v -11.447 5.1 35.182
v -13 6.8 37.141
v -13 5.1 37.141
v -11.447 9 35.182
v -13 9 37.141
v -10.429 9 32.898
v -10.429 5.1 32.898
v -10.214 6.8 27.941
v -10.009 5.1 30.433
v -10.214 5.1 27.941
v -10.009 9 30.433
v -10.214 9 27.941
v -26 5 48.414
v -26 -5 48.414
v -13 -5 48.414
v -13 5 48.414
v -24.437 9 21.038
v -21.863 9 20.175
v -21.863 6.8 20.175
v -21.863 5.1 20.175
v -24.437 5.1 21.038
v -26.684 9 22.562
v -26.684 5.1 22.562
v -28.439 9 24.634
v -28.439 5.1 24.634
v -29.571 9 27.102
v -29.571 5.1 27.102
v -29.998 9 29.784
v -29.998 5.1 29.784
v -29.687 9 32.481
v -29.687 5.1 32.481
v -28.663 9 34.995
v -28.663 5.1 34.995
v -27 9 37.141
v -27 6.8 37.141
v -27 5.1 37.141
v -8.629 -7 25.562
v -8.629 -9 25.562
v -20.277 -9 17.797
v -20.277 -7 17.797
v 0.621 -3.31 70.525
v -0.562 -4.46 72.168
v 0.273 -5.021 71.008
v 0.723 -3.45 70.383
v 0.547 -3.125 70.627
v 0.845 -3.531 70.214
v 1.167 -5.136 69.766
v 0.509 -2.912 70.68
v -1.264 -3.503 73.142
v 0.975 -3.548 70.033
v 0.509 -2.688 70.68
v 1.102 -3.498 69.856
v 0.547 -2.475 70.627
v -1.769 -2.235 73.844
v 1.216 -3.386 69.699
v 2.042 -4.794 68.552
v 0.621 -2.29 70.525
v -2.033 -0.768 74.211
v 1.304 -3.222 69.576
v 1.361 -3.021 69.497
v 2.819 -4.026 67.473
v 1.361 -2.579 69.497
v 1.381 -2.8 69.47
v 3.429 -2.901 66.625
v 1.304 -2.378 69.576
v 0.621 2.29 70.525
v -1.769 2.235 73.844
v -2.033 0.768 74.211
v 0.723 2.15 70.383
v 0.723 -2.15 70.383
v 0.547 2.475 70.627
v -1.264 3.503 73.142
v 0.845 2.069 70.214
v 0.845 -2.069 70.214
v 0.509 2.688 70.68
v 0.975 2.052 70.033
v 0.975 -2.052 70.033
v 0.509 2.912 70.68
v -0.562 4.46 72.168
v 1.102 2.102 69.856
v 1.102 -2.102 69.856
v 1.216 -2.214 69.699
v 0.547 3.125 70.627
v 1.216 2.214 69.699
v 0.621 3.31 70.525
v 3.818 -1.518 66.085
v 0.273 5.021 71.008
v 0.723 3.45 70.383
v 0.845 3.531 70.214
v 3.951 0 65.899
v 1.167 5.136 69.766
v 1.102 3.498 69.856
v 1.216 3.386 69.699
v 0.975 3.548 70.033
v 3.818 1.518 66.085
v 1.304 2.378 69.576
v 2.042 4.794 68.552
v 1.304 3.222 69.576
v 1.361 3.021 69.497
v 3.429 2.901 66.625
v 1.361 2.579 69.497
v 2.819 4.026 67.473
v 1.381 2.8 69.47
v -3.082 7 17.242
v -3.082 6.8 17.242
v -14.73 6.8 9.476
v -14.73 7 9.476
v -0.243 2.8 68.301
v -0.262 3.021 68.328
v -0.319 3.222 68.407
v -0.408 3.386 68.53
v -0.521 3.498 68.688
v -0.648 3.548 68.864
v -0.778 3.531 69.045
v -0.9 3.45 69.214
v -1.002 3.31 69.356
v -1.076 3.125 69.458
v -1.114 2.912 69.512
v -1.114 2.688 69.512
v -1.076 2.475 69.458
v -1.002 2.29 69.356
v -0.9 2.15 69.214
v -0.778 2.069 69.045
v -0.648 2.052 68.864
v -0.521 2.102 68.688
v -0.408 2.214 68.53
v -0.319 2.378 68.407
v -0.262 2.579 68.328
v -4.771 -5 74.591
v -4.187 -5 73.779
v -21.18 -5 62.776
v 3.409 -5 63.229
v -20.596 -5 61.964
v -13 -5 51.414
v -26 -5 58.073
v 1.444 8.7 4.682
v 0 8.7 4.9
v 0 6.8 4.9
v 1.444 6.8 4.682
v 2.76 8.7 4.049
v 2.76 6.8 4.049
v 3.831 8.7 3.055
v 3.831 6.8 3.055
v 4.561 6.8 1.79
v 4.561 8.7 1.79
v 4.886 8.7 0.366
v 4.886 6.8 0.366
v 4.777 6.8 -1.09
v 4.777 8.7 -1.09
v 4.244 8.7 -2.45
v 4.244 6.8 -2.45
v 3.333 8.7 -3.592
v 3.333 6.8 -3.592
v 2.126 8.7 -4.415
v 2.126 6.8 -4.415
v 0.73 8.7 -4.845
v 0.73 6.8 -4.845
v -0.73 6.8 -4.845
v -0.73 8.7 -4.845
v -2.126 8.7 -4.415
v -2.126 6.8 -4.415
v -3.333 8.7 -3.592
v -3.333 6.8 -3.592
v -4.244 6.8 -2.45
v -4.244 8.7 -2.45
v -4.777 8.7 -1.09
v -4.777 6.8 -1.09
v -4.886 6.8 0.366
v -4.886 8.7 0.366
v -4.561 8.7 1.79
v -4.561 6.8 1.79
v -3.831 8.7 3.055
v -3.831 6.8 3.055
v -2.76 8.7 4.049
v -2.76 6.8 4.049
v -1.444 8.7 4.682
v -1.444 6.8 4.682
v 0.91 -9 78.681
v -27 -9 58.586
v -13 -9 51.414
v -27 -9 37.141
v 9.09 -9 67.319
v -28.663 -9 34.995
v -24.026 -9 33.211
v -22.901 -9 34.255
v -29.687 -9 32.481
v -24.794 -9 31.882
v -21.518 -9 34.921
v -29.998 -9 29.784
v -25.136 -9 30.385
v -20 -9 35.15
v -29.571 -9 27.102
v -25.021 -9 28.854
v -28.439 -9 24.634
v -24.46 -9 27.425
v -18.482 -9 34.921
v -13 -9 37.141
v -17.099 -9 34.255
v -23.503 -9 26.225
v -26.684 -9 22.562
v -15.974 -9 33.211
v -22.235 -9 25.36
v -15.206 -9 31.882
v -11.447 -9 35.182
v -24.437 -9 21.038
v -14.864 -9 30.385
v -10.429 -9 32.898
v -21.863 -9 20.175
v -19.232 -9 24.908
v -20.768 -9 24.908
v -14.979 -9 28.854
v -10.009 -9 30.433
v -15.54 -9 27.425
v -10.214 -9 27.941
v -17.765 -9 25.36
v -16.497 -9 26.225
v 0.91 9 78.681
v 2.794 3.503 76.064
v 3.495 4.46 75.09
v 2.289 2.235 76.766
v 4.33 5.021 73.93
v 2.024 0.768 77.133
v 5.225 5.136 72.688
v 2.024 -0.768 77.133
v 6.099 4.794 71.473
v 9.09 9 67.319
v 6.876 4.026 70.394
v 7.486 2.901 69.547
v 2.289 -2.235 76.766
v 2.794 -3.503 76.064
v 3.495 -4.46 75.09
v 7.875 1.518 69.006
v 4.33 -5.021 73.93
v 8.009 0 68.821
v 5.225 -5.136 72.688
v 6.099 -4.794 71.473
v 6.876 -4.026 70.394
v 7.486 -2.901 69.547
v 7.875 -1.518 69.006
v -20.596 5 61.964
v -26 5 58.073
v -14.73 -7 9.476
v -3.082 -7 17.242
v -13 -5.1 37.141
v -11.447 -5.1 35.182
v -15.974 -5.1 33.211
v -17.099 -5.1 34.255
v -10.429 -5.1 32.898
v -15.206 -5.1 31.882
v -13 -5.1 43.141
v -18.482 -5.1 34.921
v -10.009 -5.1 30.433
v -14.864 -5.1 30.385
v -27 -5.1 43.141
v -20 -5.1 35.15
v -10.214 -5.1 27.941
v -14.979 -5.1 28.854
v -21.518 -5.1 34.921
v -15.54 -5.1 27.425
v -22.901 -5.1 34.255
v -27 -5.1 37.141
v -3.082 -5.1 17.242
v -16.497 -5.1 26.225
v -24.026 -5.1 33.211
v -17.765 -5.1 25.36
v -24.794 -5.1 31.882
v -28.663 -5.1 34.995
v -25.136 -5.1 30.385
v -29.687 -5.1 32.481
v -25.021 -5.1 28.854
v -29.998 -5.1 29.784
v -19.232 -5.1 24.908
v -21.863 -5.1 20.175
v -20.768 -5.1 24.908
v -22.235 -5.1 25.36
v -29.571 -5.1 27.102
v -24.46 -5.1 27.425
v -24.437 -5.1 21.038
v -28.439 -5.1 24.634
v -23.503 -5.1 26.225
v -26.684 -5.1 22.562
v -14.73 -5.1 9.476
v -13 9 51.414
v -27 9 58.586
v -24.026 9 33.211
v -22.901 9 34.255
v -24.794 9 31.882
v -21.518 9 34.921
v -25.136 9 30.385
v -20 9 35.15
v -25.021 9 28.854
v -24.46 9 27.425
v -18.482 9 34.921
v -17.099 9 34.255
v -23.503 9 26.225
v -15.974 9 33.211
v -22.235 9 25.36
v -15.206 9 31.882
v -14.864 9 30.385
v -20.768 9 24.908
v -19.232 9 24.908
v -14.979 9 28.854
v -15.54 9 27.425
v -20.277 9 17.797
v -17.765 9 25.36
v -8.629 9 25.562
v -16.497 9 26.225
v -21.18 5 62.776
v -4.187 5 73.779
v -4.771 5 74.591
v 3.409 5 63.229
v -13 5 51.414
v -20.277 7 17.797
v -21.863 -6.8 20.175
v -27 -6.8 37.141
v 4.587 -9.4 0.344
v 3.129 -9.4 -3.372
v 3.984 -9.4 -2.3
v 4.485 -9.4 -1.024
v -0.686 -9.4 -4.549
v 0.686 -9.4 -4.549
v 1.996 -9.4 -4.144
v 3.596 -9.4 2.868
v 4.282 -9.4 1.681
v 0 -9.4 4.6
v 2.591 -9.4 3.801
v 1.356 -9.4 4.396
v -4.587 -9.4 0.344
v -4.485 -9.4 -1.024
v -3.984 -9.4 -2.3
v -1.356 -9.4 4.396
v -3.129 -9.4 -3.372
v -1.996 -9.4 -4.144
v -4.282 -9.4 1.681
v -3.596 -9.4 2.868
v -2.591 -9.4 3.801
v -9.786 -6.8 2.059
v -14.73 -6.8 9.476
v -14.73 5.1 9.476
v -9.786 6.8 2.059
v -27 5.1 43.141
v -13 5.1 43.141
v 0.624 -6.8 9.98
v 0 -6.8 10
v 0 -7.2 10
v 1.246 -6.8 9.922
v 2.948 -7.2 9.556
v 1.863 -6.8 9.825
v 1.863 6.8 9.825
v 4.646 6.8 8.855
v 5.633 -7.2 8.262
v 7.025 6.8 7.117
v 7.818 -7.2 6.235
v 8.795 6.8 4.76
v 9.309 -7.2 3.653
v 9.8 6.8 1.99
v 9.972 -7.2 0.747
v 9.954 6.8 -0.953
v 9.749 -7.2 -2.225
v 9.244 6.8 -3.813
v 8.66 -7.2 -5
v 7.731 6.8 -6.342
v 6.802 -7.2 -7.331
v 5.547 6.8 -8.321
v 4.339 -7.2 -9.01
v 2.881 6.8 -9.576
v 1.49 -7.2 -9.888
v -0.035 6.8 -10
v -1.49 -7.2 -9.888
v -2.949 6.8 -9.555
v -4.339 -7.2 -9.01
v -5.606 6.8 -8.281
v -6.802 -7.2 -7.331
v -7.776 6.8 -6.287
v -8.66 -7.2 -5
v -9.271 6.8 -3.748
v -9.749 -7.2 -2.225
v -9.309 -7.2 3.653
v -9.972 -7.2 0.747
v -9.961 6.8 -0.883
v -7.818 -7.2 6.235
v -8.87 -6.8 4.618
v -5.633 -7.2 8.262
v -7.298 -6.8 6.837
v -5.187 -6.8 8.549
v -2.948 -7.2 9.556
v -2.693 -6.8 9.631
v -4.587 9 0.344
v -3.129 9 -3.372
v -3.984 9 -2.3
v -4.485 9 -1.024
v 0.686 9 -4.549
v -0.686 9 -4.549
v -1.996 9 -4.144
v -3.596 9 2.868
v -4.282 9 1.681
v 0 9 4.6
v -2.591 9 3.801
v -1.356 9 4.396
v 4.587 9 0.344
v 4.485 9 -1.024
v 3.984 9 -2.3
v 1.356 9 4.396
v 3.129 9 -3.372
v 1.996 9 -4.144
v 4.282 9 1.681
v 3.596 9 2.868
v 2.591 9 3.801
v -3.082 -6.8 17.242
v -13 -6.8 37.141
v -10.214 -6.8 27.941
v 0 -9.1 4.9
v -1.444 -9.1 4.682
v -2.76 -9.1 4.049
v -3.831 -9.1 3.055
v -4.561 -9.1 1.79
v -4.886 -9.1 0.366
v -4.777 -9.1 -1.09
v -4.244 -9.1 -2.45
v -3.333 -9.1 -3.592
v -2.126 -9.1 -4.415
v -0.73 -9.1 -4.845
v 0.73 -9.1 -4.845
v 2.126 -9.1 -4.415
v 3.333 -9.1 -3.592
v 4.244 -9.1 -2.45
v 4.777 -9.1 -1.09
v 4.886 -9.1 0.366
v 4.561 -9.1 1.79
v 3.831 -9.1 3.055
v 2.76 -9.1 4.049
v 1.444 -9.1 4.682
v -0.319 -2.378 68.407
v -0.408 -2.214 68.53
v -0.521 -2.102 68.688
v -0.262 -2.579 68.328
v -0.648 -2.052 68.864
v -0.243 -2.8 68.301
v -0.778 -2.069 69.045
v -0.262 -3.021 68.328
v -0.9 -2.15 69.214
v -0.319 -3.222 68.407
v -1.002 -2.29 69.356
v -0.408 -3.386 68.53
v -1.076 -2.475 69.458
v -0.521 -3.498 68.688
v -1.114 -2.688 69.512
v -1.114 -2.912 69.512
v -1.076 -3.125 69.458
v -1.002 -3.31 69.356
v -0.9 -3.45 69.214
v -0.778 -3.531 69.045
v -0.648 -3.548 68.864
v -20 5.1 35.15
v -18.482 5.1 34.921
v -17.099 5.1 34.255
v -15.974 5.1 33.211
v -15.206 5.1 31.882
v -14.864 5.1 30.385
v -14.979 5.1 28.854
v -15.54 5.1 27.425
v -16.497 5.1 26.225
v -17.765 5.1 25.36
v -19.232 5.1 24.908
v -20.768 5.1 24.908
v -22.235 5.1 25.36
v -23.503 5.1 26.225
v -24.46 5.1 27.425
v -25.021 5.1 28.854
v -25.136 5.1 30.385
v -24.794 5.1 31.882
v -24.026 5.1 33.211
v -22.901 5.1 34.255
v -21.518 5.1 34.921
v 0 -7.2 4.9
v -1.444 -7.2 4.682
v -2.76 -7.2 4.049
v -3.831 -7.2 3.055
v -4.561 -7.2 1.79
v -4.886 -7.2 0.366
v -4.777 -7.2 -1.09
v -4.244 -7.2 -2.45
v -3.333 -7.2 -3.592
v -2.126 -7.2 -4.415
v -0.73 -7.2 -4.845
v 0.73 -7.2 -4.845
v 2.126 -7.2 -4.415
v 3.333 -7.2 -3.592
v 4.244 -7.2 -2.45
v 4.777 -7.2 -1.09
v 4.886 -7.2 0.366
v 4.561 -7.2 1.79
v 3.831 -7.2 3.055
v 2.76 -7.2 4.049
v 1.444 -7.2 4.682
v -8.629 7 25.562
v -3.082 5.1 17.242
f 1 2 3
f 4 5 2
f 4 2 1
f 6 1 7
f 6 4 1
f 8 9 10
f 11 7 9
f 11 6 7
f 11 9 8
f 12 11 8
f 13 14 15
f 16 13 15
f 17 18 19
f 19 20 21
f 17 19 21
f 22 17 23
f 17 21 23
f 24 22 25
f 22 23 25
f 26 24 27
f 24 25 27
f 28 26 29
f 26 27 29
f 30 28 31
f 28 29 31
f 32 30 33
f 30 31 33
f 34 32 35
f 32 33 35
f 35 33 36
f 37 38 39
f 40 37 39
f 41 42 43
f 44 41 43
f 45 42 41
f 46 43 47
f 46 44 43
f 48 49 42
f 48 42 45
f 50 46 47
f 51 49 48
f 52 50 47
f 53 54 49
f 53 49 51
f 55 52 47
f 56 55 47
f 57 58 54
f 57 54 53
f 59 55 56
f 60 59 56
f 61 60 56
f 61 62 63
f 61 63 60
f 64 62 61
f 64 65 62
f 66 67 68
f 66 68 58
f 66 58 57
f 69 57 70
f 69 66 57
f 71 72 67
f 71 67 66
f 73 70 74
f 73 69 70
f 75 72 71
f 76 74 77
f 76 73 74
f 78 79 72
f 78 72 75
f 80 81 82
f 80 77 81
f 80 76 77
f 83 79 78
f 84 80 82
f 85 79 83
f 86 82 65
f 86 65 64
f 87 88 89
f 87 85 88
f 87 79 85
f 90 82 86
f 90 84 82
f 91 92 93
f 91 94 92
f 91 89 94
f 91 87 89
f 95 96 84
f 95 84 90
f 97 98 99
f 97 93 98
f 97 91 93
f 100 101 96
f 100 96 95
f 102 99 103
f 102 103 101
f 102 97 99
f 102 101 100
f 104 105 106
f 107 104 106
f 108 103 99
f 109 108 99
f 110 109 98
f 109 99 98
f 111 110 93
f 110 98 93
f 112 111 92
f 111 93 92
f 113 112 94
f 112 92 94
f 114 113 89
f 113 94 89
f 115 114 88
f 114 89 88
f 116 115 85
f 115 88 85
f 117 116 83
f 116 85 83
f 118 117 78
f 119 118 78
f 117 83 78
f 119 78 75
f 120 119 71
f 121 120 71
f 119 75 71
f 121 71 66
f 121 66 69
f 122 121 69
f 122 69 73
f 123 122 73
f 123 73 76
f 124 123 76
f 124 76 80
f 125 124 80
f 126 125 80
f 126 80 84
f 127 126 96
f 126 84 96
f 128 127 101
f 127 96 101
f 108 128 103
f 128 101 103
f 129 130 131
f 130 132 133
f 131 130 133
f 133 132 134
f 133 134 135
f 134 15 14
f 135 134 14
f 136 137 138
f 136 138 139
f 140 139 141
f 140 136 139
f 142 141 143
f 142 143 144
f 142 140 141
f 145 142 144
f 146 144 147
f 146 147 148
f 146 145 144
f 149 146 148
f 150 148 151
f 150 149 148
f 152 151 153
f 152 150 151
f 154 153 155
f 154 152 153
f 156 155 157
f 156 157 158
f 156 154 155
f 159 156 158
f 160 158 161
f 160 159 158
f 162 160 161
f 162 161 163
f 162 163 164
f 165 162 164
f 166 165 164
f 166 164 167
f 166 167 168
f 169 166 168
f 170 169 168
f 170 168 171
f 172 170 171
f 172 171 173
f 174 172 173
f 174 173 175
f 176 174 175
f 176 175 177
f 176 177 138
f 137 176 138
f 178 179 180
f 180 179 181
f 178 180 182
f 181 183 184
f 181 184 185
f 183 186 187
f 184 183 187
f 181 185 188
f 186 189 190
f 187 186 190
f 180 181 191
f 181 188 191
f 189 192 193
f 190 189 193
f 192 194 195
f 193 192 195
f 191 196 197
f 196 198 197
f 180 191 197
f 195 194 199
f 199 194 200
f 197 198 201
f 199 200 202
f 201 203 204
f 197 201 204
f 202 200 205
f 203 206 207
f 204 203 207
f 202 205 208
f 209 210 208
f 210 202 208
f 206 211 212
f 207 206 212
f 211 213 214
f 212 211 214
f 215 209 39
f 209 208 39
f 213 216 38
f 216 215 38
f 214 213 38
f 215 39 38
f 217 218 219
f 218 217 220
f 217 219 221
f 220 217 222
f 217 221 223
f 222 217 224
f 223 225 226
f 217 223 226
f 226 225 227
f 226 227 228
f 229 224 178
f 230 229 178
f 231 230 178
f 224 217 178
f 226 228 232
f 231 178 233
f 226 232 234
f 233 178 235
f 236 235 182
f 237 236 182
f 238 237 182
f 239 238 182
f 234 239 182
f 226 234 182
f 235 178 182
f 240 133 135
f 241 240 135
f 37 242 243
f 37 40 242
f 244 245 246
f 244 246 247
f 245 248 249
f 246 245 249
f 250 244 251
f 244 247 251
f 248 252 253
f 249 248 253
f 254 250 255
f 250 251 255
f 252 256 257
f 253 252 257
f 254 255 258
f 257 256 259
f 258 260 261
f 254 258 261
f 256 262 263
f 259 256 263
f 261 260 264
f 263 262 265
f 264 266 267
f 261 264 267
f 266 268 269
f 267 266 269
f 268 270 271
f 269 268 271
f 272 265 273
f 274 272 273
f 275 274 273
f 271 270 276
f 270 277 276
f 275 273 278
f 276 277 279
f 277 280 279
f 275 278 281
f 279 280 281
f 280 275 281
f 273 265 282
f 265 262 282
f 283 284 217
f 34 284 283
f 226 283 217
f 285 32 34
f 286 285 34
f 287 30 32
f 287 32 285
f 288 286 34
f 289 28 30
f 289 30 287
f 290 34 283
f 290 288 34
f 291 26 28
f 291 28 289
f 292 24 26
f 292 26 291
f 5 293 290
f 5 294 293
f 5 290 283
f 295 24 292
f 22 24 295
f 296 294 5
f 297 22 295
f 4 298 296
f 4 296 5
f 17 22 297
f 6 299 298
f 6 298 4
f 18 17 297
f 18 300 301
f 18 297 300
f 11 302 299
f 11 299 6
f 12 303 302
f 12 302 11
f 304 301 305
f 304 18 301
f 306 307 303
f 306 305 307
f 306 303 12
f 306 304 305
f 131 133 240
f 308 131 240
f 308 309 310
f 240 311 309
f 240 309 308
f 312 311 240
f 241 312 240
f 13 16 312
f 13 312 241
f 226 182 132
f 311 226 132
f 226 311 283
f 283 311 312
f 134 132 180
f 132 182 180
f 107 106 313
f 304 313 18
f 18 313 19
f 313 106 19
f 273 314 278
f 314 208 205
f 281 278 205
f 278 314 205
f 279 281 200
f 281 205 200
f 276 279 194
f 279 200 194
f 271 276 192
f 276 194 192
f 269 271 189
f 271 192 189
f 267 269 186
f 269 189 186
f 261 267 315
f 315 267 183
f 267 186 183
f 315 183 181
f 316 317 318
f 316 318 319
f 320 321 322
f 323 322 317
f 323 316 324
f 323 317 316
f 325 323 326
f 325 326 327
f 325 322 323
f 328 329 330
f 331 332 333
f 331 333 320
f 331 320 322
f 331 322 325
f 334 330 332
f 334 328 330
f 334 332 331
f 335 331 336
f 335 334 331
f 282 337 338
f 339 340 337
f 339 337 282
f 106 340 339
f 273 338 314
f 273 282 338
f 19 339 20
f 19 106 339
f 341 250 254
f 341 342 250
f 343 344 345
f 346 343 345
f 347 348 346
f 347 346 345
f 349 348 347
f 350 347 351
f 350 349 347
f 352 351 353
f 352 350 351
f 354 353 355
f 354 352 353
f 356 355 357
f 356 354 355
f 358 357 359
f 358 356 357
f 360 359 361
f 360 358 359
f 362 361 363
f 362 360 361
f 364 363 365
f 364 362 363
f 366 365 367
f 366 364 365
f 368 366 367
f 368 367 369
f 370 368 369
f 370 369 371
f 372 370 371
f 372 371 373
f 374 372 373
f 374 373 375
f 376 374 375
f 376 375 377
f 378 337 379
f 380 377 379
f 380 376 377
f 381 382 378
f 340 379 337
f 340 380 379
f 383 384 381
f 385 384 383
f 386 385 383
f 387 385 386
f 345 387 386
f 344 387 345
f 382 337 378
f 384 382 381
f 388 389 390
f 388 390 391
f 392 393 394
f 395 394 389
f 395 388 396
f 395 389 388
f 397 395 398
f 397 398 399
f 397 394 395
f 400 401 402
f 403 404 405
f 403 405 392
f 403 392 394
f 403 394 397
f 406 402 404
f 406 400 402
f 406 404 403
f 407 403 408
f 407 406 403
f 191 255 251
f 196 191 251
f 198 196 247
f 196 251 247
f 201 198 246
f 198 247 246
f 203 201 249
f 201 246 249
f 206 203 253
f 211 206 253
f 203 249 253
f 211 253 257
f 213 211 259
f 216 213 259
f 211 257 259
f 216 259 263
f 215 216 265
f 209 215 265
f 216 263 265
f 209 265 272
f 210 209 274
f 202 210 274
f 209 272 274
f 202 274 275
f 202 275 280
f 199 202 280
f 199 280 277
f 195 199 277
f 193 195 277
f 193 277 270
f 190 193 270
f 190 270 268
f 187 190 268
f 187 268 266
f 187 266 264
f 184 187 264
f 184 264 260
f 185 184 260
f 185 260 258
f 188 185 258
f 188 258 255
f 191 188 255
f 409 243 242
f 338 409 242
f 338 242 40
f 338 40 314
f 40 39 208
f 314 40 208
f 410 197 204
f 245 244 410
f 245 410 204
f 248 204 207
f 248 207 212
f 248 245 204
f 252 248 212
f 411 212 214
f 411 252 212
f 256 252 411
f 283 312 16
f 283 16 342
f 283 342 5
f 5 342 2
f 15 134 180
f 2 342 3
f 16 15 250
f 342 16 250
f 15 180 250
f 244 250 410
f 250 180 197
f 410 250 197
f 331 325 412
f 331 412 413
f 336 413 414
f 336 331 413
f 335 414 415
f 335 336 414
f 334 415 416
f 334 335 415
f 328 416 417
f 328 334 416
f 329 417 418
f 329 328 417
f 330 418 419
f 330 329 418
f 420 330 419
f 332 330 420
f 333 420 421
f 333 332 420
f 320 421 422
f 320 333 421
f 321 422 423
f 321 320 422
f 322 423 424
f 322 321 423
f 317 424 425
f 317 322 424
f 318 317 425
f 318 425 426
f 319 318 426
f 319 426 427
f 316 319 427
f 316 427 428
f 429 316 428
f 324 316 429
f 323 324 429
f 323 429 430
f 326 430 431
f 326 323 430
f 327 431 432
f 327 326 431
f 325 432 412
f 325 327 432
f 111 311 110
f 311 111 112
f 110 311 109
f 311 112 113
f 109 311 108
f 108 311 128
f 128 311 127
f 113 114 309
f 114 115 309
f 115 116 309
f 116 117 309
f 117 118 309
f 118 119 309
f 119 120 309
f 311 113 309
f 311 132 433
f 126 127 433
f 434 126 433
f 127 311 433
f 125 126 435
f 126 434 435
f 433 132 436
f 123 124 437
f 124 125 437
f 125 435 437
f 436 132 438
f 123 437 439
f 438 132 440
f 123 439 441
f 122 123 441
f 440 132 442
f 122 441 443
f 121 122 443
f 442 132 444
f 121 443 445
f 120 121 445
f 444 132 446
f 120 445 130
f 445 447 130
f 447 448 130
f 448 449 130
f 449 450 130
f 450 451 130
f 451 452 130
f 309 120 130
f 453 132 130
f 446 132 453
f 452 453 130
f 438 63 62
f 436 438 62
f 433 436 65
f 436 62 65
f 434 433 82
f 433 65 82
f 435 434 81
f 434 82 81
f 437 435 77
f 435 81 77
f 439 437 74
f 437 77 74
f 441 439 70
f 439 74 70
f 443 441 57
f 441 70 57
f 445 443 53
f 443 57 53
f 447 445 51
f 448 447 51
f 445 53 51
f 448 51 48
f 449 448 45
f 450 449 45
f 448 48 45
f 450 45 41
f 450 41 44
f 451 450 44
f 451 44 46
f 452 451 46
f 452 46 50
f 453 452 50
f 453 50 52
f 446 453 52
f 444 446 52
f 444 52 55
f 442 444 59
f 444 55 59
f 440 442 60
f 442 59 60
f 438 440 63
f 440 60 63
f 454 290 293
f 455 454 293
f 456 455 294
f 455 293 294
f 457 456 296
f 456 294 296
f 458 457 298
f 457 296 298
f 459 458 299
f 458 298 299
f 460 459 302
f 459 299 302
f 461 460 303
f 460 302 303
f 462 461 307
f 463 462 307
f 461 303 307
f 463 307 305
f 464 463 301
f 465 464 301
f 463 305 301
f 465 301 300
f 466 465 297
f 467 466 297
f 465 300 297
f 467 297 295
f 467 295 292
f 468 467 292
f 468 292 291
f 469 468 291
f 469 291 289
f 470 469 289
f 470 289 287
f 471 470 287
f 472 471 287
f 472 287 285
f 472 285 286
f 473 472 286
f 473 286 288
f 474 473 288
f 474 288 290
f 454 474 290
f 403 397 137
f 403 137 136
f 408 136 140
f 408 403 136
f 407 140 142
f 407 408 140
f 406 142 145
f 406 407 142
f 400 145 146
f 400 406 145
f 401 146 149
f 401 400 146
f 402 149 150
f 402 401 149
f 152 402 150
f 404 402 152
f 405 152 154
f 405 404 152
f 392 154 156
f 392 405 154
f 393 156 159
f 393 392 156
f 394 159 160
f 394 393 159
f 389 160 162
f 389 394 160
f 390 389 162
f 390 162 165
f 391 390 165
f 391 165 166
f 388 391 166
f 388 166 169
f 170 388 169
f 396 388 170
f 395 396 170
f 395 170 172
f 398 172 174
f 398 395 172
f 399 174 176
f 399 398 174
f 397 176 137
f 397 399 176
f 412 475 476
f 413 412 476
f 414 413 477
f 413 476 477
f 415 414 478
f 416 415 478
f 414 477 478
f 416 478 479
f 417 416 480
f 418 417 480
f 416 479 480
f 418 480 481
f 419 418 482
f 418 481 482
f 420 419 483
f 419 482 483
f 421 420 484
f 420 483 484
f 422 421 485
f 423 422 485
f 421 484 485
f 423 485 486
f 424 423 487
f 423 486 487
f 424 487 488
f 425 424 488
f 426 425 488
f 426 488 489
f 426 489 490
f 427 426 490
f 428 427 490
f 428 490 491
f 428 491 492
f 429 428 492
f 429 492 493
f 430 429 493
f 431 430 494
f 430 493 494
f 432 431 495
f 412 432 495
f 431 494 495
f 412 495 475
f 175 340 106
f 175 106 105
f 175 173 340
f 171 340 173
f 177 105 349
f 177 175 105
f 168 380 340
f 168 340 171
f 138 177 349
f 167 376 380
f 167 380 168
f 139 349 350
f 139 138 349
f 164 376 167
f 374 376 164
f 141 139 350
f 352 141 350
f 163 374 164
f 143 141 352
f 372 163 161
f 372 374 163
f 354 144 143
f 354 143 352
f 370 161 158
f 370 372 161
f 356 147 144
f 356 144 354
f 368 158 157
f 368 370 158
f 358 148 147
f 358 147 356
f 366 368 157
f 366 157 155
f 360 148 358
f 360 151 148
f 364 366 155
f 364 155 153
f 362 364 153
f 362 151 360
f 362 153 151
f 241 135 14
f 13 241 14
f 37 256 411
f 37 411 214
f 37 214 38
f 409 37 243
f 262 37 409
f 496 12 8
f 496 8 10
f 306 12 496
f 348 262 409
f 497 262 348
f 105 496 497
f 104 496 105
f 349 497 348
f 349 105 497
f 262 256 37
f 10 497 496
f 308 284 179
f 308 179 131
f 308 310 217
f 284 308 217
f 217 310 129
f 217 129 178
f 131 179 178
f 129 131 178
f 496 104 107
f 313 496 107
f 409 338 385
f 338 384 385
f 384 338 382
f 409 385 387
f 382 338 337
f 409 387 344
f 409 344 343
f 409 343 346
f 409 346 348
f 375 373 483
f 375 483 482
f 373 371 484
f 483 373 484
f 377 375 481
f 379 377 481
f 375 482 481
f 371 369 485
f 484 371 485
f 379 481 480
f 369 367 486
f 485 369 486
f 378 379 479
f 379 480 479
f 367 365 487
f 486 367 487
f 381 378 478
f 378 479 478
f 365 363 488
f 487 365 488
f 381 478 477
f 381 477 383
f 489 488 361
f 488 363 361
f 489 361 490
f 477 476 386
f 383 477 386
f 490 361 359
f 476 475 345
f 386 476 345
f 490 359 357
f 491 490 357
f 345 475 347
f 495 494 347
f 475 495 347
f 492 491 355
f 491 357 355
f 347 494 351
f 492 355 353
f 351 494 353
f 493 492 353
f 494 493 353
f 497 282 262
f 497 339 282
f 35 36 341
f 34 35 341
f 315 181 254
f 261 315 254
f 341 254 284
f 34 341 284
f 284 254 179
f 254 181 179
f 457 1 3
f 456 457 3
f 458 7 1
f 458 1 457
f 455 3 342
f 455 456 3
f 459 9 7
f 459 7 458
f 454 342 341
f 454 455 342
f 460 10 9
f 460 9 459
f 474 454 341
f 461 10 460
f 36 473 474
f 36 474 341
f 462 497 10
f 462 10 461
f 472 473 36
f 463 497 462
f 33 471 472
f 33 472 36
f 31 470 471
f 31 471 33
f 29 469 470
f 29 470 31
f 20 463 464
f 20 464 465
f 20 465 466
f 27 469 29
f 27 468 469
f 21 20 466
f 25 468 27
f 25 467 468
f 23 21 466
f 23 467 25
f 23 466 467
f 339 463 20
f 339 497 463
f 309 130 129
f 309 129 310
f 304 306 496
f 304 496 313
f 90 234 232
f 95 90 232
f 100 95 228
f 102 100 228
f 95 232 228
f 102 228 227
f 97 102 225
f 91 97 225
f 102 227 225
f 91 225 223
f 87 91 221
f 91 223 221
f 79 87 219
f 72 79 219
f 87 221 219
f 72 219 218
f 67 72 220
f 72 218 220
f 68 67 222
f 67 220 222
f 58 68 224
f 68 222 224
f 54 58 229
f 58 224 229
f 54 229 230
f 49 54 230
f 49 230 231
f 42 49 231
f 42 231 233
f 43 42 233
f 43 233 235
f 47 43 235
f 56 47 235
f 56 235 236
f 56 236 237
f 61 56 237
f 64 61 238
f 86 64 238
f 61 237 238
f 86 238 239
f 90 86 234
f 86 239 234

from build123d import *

# Parameters (mm, degrees)
EXTRUDE_1_DEPTH          = 6.8
SKETCH_2_R               = 10
EXTRUDE_1_2_DEPTH        = 14
EXTRUDE_2_DEPTH          = 9
CUT_EXTRUDE_1_DEPTH      = 5.1
SKETCH_5_R               = 4.9
EXTRUDE_3_DEPTH          = 15
SKETCH_6_R               = 5.15
CUT_EXTRUDE_5_DEPTH      = 20
CUT_EXTRUDE_8_DEPTH      = 5
CUT_EXTRUDE_8_DEPTH_BACK = 5
CUT_EXTRUDE_8_START      = -9
SKETCH_9_R               = 5.15
CUT_EXTRUDE_9_DEPTH      = 5
SKETCH_11_R              = 0.75
CUT_EXTRUDE_10_DEPTH     = 2
CUT_EXTRUDE_11_DEPTH     = 2
CUT_EXTRUDE_12_DEPTH     = 2
SKETCH_7_W               = 20.220207393
SKETCH_7_H               = 10
CUT_EXTRUDE_14_DEPTH     = 14
CHAMFER_C0_3_SIZE        = 0.3
SKETCH_19_R              = 4.9
EXTRUDE_9_8_2_2_DEPTH    = 2.2
CHAMFER_C0_3_2_SIZE      = 0.3


with BuildPart() as part:
    # 草图1 → Extrude 1 (new, symmetric)
    with BuildSketch(Plane(origin=(0, 0, 0), x_dir=(1, 0, 0), z_dir=(0, 1, 0))):
        Polygon((-5.82435206, 3.882901374), (-27, -27.880570536), (-27, -58.585636208), (0.909866919, -78.68074039), (9.090133081, -67.31925961), (-13, -51.414363792), (-13, -32.119429464), (5.82435206, -3.882901374), align=None)
    extrude(amount=EXTRUDE_1_DEPTH, both=True)

    # 草图2 → Extrude 1 2 (add)
    with BuildSketch(Plane(origin=(0, 6.8, 0), x_dir=(1, 0, 0), z_dir=(0, 1, 0))):
        Circle(SKETCH_2_R)
        with Locations((-20, -30)):
            Circle(SKETCH_2_R)
    extrude(amount=-EXTRUDE_1_2_DEPTH)

    # 草图3 → 凸台-拉伸2 (add, symmetric)
    with BuildSketch(Plane(origin=(0, 0, 0), x_dir=(1, 0, 0), z_dir=(0, 1, 0))):
        with BuildLine():
            Line((-3.081644015, -17.241895487), (-14.730348136, -9.47609274))
            Line((-14.730348136, -9.47609274), (-21.86300031, -20.175071))
            ThreePointArc((-21.86300031, -20.175071), (-29.570920265, -27.102158513), (-27, -37.141428429))
            Line((-27, -37.141428429), (-27, -58.585636208))
            Line((-27, -58.585636208), (0.909866919, -78.68074039))
            Line((0.909866919, -78.68074039), (9.090133081, -67.31925961))
            Line((9.090133081, -67.31925961), (-13, -51.414363792))
            Line((-13, -51.414363792), (-13, -37.141428429))
            ThreePointArc((-13, -37.141428429), (-10.429079735, -32.897841487), (-10.214296189, -27.940873748))
            Line((-10.214296189, -27.940873748), (-3.081644015, -17.241895487))
        make_face()
    extrude(amount=EXTRUDE_2_DEPTH, both=True)

    # 草图4 → 切除-拉伸1 (cut, symmetric)
    with BuildSketch(Plane(origin=(0, 0, 0), x_dir=(1, 0, 0), z_dir=(0, 1, 0))):
        with BuildLine():
            Line((-13, -37.141428429), (-13, -43.141428429))
            Line((-13, -43.141428429), (-27, -43.141428429))
            Line((-27, -43.141428429), (-27, -37.141428429))
            ThreePointArc((-27, -37.141428429), (-29.570920265, -27.102158513), (-21.86300031, -20.175071))
            Line((-21.86300031, -20.175071), (-14.730348136, -9.47609274))
            Line((-14.730348136, -9.47609274), (-3.081644015, -17.241895487))
            Line((-3.081644015, -17.241895487), (-10.214296189, -27.940873748))
            ThreePointArc((-10.214296189, -27.940873748), (-10.429079735, -32.897841487), (-13, -37.141428429))
        make_face()
    extrude(amount=CUT_EXTRUDE_1_DEPTH, both=True, mode=Mode.SUBTRACT)

    # 草图5 → 凸台-拉伸3 (add)
    with BuildSketch(Plane(origin=(0, 9, 0), x_dir=(1, 0, 0), z_dir=(0, 1, 0))):
        Circle(SKETCH_5_R)
    extrude(amount=-EXTRUDE_3_DEPTH)

    # 草图6 → 切除-拉伸5 (cut)
    with BuildSketch(Plane(origin=(0, 9, 0), x_dir=(1, 0, 0), z_dir=(0, 1, 0))):
        with Locations((-20, -30)):
            Circle(SKETCH_6_R)
    extrude(amount=-CUT_EXTRUDE_5_DEPTH, mode=Mode.SUBTRACT)

    # 草图8 → 切除-拉伸8 (cut, two sides: drawn at the far end of the back side and taken through both)
    with BuildSketch(Plane(origin=(0, 9, 0), x_dir=(1, 0, 0), z_dir=(0, 1, 0)).offset(CUT_EXTRUDE_8_START - CUT_EXTRUDE_8_DEPTH_BACK)):
        Polygon((3.409392691, -63.229126529), (-4.186568745, -73.779072968), (-26, -58.073402464), (-26, -48.414363792), (-13, -48.414363792), (-13, -51.414363792), align=None)
    extrude(amount=CUT_EXTRUDE_8_DEPTH + CUT_EXTRUDE_8_DEPTH_BACK, mode=Mode.SUBTRACT)

    # 草图9 → 切除-拉伸9 (cut)
    with BuildSketch(Plane(origin=(37.908324552, 0, 27.293993678), x_dir=(0.5843047258450756, 0, -0.8115343414514946), z_dir=(0.8115343414514946, 0, 0.5843047258450756))):
        with Locations((-56.320483297, 0)):
            Circle(SKETCH_9_R)
    extrude(amount=-CUT_EXTRUDE_9_DEPTH, mode=Mode.SUBTRACT)

    # 草图11 → 切除-拉伸10 (cut)
    with BuildSketch(Plane(origin=(33.850652845, 0, 24.372470048), x_dir=(0.5843047258450756, 0, -0.8115343414514947), z_dir=(0.8115343414514947, 0, 0.5843047258450756))):
        with Locations((-56.320483297, 2.8)):
            Circle(SKETCH_11_R)
        with Locations((-56.320483297, -2.8)):
            Circle(SKETCH_11_R)
    extrude(amount=-CUT_EXTRUDE_10_DEPTH, mode=Mode.SUBTRACT)

    # 草图12 → 切除-拉伸11 (cut)
    with BuildSketch(Plane(origin=(0, 9, 0), x_dir=(1, 0, 0), z_dir=(0, 1, 0))):
        Polygon((-14.730348136, -9.47609274), (-3.081644015, -17.241895487), (-8.628645977, -25.56239843), (-20.277350098, -17.796595683), align=None)
    extrude(amount=-CUT_EXTRUDE_11_DEPTH, mode=Mode.SUBTRACT)

    # 草图13 → 切除-拉伸12 (cut)
    with BuildSketch(Plane.XZ.offset(9)):
        Polygon((-14.730348136, 9.47609274), (-3.081644015, 17.241895487), (-8.628645977, 25.56239843), (-20.277350098, 17.796595683), align=None)
    extrude(amount=-CUT_EXTRUDE_12_DEPTH, mode=Mode.SUBTRACT)

    # 草图7 → 切除-拉伸14 (cut)
    with BuildSketch(Plane(origin=(-28.818191471, 0, 40.025265932), x_dir=(-0.8115343414514946, 0, -0.5843047258450756), z_dir=(0.5843047258450756, 0, -0.8115343414514946))):
        with Locations((-29.601812998, 0)):
            Rectangle(SKETCH_7_W, SKETCH_7_H)
    extrude(amount=-CUT_EXTRUDE_14_DEPTH, mode=Mode.SUBTRACT)

    # Chamfer C0.3
    chamfer_c0_3_edges = [part.edges().sort_by_distance(p)[0] for p in [
        (-4.9, 9, 0),
    ]]
    chamfer(chamfer_c0_3_edges, length=CHAMFER_C0_3_SIZE)

    # 草图19 → 另一侧圆柱_直径9.8_外伸2.2 (add)
    with BuildSketch(Plane.XZ.offset(7.2)):
        Circle(SKETCH_19_R)
    extrude(amount=EXTRUDE_9_8_2_2_DEPTH)

    # Chamfer C0.3 2
    chamfer_c0_3_2_edges = [part.edges().sort_by_distance(p)[0] for p in [
        (-4.9, -9.4, 0),
    ]]
    chamfer(chamfer_c0_3_2_edges, length=CHAMFER_C0_3_2_SIZE)


solid = part.part
